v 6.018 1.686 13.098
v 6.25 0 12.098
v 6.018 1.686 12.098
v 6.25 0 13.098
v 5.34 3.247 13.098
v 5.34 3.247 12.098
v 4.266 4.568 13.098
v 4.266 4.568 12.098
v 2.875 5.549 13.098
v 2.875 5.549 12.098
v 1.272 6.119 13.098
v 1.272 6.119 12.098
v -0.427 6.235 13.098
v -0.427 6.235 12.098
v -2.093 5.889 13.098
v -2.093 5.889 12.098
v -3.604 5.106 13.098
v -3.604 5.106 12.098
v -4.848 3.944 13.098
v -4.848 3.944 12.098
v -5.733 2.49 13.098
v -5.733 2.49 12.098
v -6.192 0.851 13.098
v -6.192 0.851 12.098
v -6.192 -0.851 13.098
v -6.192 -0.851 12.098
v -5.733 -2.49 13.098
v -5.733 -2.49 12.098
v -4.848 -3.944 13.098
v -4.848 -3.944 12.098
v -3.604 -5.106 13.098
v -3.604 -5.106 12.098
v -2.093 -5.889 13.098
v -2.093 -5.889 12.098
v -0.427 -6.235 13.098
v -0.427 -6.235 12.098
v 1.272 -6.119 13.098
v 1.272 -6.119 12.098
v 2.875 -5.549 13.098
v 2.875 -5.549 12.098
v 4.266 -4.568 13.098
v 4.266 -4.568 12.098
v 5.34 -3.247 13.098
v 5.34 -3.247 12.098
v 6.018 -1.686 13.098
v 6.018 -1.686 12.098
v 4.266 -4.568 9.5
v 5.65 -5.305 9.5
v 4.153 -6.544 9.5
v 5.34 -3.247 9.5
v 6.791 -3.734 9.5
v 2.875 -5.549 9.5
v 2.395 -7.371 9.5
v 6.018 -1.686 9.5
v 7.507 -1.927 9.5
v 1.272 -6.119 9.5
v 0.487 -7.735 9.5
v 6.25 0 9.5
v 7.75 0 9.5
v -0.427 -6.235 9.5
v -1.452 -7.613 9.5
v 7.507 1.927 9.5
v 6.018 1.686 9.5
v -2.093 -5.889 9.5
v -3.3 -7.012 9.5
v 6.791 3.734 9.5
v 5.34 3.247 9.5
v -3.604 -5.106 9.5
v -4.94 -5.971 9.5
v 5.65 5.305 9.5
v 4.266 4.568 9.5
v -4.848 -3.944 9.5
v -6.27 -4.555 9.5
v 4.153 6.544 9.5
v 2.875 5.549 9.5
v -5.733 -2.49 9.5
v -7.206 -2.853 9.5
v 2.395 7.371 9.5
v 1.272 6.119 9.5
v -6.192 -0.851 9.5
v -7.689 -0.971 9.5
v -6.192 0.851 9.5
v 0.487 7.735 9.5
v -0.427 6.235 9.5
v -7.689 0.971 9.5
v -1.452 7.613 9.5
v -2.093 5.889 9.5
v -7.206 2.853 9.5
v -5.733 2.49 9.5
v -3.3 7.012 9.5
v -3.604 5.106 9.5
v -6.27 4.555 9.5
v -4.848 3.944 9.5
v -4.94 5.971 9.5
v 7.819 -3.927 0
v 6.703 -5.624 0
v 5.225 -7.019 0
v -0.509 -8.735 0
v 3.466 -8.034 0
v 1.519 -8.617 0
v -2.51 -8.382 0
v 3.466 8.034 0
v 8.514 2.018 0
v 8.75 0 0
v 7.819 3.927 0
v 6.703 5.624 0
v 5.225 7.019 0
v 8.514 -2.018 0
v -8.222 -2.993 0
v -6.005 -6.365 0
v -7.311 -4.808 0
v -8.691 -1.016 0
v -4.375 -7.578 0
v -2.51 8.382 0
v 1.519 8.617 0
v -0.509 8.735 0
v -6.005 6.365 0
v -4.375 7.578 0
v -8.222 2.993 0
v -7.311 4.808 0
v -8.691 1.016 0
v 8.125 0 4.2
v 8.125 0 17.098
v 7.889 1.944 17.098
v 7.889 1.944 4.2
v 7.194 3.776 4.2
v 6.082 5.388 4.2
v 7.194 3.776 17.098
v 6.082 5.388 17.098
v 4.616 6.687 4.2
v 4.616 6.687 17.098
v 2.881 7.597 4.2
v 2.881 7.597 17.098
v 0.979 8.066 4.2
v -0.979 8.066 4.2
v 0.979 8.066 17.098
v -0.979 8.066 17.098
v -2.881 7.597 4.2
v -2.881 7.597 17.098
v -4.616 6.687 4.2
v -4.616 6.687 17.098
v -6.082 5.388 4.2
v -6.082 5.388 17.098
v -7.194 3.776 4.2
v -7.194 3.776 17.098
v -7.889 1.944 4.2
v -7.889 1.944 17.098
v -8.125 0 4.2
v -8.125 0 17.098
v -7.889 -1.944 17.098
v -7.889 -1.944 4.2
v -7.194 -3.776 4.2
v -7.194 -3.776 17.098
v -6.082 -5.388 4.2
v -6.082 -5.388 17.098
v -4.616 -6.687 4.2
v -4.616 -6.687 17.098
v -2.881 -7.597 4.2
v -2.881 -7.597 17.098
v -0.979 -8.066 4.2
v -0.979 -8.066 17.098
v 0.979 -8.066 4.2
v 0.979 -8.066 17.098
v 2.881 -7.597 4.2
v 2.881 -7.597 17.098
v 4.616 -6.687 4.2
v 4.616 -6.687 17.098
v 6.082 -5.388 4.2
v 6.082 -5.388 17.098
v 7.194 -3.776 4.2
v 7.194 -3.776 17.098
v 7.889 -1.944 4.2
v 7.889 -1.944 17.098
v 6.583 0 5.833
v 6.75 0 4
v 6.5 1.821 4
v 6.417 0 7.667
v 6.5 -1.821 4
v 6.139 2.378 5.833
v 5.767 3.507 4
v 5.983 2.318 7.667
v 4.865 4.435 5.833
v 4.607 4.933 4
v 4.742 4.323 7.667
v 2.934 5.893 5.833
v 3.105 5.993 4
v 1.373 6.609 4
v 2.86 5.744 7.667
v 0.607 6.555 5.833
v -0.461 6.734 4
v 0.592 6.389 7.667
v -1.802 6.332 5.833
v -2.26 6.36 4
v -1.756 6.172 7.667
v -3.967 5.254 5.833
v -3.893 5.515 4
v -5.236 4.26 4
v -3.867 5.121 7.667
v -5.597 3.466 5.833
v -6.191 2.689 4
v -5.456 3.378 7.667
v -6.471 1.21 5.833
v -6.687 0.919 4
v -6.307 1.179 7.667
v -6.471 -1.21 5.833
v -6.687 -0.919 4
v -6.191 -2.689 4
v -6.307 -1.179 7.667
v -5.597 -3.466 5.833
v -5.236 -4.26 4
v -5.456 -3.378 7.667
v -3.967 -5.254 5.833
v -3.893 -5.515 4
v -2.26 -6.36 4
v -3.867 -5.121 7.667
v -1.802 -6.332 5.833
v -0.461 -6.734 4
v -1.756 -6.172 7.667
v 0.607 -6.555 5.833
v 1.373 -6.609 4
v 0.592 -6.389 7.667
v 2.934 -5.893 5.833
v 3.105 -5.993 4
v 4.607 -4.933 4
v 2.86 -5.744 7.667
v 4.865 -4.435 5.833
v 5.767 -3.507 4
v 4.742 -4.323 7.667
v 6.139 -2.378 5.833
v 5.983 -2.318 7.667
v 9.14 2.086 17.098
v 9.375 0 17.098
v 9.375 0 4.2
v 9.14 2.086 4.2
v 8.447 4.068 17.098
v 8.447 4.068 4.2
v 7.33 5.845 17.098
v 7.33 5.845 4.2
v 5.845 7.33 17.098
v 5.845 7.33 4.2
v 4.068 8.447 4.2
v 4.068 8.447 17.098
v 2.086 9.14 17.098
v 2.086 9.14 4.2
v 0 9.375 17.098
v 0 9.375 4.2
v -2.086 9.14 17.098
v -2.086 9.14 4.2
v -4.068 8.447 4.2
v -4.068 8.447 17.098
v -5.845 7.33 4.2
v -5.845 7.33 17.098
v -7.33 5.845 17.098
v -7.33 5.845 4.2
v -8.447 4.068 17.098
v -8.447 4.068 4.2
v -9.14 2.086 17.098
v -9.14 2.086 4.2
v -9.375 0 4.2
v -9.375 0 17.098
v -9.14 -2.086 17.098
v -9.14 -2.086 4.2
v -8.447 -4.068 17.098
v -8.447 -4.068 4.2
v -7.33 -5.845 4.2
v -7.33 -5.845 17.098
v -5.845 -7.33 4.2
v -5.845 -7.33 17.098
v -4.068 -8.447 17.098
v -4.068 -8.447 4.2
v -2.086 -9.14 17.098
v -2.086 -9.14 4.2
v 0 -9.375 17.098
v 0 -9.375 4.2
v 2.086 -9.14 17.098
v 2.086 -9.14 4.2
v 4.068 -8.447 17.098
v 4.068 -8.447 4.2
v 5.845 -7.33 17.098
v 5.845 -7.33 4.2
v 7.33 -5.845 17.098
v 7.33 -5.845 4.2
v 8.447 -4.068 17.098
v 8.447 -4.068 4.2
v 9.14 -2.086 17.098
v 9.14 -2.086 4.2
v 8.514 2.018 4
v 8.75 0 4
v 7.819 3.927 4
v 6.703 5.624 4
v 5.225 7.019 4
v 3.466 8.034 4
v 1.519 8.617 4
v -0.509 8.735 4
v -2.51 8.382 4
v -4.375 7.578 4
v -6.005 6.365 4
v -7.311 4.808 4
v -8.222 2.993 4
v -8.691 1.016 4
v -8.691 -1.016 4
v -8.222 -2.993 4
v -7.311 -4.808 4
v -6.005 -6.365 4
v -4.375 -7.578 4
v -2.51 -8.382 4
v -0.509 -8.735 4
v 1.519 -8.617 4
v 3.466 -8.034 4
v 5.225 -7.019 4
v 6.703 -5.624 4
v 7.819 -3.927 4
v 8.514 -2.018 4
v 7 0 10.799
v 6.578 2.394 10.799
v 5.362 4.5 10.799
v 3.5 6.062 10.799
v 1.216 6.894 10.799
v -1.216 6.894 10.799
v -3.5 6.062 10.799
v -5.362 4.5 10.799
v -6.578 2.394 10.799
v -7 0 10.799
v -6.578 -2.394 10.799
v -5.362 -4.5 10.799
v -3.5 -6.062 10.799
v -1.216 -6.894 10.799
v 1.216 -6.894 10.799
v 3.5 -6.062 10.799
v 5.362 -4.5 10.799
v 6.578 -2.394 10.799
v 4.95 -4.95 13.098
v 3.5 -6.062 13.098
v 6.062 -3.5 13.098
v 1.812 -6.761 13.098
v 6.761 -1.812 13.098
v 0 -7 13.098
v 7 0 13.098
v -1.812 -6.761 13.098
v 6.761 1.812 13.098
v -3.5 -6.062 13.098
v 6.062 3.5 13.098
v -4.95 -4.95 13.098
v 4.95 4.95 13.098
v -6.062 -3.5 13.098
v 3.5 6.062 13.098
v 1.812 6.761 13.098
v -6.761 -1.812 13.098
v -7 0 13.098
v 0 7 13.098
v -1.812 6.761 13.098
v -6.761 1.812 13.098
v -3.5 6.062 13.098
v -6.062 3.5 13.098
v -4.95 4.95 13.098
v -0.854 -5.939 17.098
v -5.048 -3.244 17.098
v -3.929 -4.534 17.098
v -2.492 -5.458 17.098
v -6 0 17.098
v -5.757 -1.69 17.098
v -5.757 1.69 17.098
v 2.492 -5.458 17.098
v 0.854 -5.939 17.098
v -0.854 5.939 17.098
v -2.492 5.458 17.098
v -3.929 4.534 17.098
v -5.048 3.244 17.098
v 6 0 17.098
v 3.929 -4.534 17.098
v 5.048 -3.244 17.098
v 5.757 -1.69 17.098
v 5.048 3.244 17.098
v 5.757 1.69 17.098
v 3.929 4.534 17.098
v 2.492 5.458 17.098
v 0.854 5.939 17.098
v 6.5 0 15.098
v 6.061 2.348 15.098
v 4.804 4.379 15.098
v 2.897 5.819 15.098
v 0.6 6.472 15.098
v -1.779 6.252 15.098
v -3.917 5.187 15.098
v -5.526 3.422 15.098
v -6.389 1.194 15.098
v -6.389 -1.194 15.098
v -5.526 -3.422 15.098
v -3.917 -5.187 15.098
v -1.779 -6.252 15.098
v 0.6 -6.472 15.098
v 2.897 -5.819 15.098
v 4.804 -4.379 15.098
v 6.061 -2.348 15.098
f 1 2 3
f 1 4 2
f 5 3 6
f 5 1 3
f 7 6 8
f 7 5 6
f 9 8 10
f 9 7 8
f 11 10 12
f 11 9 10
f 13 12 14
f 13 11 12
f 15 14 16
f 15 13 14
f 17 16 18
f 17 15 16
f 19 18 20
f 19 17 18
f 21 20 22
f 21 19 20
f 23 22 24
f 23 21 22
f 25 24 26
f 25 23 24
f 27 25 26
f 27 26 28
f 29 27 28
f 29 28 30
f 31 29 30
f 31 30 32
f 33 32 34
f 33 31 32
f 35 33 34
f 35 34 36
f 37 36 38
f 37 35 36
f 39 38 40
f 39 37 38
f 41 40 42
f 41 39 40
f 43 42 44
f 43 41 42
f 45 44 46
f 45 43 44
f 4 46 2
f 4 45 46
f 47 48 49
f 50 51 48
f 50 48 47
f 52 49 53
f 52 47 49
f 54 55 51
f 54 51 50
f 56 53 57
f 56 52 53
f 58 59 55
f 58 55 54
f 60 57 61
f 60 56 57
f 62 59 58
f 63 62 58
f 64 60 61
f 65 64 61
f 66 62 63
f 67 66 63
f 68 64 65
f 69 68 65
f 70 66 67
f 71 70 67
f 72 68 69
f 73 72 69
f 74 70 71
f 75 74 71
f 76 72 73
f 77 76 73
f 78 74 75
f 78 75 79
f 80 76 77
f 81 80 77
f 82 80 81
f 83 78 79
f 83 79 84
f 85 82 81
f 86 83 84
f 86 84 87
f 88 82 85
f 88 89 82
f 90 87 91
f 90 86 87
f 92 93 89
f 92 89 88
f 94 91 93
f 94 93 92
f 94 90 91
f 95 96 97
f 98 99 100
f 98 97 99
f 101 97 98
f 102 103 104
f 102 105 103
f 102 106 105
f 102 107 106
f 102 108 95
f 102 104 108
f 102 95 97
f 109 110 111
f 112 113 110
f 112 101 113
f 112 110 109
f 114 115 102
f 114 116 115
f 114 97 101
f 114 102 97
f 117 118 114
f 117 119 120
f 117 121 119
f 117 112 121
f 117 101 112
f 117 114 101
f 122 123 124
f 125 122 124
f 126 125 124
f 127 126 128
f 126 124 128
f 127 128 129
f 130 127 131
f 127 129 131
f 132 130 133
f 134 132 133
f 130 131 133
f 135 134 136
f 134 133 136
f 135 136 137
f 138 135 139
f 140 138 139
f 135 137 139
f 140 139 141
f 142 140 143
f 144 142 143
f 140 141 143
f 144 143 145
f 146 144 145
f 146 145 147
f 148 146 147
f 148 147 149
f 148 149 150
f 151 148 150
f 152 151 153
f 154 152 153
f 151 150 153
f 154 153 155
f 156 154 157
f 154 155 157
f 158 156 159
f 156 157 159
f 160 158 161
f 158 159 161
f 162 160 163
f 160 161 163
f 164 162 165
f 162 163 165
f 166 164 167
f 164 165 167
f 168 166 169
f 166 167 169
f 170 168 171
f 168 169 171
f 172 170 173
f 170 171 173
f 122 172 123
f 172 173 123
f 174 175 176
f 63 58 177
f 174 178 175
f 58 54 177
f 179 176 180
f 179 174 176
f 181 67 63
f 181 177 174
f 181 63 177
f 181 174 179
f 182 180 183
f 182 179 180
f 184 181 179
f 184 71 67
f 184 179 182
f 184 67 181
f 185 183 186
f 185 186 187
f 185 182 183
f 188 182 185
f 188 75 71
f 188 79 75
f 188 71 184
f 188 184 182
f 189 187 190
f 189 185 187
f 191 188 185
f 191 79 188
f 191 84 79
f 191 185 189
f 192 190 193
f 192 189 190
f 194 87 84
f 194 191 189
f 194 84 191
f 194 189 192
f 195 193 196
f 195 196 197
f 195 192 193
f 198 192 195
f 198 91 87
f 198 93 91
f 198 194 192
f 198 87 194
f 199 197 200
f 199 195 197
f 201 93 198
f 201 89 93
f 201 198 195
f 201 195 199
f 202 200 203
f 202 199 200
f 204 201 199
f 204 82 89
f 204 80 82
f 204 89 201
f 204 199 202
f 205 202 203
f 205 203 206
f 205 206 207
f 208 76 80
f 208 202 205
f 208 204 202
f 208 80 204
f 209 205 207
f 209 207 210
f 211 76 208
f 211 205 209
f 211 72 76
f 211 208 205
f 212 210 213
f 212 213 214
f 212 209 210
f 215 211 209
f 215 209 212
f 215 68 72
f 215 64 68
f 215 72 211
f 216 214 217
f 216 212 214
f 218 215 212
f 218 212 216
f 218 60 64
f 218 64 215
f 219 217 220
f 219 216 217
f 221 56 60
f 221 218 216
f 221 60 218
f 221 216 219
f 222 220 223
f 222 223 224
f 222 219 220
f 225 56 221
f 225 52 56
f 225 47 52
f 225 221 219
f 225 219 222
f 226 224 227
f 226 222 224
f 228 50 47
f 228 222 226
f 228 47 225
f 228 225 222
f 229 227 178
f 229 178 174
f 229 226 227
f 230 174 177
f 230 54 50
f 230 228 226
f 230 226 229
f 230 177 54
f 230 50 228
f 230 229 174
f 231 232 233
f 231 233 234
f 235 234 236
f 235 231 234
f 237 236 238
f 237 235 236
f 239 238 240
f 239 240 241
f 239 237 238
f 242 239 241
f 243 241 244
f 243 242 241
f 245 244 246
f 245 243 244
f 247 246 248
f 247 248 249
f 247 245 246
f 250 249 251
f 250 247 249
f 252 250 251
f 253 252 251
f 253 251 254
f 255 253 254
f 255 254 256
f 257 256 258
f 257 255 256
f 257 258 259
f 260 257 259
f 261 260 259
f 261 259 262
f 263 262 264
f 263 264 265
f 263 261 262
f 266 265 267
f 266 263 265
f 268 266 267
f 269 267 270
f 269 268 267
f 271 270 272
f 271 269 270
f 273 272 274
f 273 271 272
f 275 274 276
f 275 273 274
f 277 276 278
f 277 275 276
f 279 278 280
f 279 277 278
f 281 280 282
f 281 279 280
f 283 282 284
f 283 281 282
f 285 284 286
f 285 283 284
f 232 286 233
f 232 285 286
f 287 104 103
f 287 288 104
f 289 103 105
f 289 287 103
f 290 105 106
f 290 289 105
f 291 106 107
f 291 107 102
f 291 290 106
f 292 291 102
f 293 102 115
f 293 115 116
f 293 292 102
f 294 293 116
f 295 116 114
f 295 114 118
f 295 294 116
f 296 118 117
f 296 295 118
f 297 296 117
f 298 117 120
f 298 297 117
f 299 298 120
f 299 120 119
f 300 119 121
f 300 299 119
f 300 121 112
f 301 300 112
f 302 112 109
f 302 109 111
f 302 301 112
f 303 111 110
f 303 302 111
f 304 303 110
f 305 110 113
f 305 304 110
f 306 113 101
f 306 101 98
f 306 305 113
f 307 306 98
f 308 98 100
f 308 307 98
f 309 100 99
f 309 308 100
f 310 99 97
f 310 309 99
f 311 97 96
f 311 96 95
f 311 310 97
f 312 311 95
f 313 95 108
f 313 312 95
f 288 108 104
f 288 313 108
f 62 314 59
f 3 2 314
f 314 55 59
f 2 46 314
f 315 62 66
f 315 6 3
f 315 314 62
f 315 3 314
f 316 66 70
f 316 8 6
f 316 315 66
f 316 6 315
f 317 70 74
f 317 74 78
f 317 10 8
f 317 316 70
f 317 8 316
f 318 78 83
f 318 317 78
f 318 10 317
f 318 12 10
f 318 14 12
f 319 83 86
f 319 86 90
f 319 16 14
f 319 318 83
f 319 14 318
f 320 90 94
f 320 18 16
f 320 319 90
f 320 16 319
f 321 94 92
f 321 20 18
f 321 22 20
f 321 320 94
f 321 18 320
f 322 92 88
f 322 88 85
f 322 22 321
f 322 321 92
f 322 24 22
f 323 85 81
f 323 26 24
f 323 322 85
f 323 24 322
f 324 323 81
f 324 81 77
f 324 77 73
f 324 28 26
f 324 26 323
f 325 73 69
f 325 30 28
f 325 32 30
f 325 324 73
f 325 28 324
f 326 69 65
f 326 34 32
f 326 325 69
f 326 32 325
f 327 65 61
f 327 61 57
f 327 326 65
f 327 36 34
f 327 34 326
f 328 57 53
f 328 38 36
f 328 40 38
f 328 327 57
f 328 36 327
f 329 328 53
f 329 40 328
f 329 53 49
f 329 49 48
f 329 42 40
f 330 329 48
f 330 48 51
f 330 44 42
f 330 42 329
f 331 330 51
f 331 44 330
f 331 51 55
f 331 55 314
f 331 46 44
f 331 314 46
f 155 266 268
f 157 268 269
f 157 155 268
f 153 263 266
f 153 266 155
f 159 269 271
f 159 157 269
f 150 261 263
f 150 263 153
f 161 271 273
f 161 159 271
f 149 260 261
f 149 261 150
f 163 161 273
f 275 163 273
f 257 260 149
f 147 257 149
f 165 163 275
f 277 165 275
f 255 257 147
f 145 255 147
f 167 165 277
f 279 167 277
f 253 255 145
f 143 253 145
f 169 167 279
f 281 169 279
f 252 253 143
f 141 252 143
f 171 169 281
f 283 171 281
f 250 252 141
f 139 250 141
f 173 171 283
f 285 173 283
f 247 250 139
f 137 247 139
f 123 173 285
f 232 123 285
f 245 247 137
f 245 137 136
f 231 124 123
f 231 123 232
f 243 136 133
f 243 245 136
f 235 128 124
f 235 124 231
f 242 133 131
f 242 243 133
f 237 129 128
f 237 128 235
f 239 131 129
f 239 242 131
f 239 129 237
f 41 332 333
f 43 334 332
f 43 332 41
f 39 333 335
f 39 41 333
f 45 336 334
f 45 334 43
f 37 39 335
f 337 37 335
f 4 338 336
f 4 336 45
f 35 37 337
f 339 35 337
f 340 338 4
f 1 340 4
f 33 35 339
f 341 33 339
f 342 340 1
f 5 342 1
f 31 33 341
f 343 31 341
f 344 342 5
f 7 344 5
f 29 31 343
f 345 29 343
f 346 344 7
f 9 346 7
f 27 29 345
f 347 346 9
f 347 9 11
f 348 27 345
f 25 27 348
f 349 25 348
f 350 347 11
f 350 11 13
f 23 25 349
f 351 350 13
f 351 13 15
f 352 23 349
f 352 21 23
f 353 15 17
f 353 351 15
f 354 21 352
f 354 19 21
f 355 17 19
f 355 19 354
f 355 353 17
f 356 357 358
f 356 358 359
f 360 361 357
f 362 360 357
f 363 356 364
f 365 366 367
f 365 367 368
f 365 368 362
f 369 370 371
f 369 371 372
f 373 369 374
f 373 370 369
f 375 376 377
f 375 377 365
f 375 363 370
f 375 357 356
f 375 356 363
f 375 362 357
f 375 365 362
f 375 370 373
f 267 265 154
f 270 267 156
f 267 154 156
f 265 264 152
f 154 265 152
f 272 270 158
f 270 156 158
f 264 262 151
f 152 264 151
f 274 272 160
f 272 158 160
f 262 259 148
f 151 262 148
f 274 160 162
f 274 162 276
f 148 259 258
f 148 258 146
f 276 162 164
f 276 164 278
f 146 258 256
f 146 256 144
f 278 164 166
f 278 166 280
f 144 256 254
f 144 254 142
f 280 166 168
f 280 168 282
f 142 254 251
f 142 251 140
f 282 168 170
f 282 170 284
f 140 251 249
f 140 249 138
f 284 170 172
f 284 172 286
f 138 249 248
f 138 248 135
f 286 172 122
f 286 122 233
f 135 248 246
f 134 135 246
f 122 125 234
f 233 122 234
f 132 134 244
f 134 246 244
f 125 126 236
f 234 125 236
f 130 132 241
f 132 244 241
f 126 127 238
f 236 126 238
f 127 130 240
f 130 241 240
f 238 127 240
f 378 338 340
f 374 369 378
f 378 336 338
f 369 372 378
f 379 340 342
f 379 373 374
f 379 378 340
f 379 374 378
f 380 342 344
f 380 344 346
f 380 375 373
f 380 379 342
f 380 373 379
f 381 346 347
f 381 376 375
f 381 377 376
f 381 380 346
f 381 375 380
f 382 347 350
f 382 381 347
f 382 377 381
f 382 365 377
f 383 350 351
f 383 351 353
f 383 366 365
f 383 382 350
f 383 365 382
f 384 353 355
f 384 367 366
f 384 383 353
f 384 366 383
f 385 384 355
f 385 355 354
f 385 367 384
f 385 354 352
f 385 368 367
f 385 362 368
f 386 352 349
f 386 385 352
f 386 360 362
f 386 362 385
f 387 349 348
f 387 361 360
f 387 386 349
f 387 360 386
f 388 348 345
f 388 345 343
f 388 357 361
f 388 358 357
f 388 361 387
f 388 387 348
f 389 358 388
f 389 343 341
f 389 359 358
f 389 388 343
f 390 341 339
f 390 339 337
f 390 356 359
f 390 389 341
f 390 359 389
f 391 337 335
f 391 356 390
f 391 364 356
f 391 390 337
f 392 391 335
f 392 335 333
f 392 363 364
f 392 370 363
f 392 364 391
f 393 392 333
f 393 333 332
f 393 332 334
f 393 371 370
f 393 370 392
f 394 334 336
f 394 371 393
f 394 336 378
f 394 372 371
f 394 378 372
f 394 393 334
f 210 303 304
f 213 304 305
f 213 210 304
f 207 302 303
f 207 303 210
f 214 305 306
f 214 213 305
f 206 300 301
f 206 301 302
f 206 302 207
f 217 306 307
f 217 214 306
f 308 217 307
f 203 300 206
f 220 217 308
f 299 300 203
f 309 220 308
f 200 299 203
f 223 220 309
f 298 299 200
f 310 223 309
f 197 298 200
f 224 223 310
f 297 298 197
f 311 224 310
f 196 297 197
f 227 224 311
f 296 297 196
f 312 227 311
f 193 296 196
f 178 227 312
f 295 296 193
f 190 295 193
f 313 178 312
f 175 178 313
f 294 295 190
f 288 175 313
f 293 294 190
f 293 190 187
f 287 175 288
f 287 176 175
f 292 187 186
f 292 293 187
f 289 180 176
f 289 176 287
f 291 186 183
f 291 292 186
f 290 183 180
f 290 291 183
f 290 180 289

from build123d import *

# Parameters (mm, degrees)
SKETCH001_R   = 9.375
SKETCH001_R_2 = 8.125
PAD_DEPTH     = 12.898076


with BuildPart() as body:
    # Sketch → Revolution (revolve)
    with BuildSketch(Plane.XZ):
        Polygon((8.75, 0), (8.75, 4), (6.75, 4), (6.25, 9.5), (7.75, 9.5), (6.25, 12.098076), (6.25, 13.098076), (7, 13.098076), (6, 17.098076), (0, 17.098076), (0, 0), align=None)
    revolve(axis=Axis((0, 0, 0), (0, 0, 1)))


with BuildPart() as body001:
    # Sketch001 (on Edge1 of Binder) → Pad (new body)
    with BuildSketch(Plane.XY.offset(17.098076)):
        Circle(SKETCH001_R)
        Circle(SKETCH001_R_2, mode=Mode.SUBTRACT)
    extrude(amount=-PAD_DEPTH)


solid = Compound([body.part, body001.part])
